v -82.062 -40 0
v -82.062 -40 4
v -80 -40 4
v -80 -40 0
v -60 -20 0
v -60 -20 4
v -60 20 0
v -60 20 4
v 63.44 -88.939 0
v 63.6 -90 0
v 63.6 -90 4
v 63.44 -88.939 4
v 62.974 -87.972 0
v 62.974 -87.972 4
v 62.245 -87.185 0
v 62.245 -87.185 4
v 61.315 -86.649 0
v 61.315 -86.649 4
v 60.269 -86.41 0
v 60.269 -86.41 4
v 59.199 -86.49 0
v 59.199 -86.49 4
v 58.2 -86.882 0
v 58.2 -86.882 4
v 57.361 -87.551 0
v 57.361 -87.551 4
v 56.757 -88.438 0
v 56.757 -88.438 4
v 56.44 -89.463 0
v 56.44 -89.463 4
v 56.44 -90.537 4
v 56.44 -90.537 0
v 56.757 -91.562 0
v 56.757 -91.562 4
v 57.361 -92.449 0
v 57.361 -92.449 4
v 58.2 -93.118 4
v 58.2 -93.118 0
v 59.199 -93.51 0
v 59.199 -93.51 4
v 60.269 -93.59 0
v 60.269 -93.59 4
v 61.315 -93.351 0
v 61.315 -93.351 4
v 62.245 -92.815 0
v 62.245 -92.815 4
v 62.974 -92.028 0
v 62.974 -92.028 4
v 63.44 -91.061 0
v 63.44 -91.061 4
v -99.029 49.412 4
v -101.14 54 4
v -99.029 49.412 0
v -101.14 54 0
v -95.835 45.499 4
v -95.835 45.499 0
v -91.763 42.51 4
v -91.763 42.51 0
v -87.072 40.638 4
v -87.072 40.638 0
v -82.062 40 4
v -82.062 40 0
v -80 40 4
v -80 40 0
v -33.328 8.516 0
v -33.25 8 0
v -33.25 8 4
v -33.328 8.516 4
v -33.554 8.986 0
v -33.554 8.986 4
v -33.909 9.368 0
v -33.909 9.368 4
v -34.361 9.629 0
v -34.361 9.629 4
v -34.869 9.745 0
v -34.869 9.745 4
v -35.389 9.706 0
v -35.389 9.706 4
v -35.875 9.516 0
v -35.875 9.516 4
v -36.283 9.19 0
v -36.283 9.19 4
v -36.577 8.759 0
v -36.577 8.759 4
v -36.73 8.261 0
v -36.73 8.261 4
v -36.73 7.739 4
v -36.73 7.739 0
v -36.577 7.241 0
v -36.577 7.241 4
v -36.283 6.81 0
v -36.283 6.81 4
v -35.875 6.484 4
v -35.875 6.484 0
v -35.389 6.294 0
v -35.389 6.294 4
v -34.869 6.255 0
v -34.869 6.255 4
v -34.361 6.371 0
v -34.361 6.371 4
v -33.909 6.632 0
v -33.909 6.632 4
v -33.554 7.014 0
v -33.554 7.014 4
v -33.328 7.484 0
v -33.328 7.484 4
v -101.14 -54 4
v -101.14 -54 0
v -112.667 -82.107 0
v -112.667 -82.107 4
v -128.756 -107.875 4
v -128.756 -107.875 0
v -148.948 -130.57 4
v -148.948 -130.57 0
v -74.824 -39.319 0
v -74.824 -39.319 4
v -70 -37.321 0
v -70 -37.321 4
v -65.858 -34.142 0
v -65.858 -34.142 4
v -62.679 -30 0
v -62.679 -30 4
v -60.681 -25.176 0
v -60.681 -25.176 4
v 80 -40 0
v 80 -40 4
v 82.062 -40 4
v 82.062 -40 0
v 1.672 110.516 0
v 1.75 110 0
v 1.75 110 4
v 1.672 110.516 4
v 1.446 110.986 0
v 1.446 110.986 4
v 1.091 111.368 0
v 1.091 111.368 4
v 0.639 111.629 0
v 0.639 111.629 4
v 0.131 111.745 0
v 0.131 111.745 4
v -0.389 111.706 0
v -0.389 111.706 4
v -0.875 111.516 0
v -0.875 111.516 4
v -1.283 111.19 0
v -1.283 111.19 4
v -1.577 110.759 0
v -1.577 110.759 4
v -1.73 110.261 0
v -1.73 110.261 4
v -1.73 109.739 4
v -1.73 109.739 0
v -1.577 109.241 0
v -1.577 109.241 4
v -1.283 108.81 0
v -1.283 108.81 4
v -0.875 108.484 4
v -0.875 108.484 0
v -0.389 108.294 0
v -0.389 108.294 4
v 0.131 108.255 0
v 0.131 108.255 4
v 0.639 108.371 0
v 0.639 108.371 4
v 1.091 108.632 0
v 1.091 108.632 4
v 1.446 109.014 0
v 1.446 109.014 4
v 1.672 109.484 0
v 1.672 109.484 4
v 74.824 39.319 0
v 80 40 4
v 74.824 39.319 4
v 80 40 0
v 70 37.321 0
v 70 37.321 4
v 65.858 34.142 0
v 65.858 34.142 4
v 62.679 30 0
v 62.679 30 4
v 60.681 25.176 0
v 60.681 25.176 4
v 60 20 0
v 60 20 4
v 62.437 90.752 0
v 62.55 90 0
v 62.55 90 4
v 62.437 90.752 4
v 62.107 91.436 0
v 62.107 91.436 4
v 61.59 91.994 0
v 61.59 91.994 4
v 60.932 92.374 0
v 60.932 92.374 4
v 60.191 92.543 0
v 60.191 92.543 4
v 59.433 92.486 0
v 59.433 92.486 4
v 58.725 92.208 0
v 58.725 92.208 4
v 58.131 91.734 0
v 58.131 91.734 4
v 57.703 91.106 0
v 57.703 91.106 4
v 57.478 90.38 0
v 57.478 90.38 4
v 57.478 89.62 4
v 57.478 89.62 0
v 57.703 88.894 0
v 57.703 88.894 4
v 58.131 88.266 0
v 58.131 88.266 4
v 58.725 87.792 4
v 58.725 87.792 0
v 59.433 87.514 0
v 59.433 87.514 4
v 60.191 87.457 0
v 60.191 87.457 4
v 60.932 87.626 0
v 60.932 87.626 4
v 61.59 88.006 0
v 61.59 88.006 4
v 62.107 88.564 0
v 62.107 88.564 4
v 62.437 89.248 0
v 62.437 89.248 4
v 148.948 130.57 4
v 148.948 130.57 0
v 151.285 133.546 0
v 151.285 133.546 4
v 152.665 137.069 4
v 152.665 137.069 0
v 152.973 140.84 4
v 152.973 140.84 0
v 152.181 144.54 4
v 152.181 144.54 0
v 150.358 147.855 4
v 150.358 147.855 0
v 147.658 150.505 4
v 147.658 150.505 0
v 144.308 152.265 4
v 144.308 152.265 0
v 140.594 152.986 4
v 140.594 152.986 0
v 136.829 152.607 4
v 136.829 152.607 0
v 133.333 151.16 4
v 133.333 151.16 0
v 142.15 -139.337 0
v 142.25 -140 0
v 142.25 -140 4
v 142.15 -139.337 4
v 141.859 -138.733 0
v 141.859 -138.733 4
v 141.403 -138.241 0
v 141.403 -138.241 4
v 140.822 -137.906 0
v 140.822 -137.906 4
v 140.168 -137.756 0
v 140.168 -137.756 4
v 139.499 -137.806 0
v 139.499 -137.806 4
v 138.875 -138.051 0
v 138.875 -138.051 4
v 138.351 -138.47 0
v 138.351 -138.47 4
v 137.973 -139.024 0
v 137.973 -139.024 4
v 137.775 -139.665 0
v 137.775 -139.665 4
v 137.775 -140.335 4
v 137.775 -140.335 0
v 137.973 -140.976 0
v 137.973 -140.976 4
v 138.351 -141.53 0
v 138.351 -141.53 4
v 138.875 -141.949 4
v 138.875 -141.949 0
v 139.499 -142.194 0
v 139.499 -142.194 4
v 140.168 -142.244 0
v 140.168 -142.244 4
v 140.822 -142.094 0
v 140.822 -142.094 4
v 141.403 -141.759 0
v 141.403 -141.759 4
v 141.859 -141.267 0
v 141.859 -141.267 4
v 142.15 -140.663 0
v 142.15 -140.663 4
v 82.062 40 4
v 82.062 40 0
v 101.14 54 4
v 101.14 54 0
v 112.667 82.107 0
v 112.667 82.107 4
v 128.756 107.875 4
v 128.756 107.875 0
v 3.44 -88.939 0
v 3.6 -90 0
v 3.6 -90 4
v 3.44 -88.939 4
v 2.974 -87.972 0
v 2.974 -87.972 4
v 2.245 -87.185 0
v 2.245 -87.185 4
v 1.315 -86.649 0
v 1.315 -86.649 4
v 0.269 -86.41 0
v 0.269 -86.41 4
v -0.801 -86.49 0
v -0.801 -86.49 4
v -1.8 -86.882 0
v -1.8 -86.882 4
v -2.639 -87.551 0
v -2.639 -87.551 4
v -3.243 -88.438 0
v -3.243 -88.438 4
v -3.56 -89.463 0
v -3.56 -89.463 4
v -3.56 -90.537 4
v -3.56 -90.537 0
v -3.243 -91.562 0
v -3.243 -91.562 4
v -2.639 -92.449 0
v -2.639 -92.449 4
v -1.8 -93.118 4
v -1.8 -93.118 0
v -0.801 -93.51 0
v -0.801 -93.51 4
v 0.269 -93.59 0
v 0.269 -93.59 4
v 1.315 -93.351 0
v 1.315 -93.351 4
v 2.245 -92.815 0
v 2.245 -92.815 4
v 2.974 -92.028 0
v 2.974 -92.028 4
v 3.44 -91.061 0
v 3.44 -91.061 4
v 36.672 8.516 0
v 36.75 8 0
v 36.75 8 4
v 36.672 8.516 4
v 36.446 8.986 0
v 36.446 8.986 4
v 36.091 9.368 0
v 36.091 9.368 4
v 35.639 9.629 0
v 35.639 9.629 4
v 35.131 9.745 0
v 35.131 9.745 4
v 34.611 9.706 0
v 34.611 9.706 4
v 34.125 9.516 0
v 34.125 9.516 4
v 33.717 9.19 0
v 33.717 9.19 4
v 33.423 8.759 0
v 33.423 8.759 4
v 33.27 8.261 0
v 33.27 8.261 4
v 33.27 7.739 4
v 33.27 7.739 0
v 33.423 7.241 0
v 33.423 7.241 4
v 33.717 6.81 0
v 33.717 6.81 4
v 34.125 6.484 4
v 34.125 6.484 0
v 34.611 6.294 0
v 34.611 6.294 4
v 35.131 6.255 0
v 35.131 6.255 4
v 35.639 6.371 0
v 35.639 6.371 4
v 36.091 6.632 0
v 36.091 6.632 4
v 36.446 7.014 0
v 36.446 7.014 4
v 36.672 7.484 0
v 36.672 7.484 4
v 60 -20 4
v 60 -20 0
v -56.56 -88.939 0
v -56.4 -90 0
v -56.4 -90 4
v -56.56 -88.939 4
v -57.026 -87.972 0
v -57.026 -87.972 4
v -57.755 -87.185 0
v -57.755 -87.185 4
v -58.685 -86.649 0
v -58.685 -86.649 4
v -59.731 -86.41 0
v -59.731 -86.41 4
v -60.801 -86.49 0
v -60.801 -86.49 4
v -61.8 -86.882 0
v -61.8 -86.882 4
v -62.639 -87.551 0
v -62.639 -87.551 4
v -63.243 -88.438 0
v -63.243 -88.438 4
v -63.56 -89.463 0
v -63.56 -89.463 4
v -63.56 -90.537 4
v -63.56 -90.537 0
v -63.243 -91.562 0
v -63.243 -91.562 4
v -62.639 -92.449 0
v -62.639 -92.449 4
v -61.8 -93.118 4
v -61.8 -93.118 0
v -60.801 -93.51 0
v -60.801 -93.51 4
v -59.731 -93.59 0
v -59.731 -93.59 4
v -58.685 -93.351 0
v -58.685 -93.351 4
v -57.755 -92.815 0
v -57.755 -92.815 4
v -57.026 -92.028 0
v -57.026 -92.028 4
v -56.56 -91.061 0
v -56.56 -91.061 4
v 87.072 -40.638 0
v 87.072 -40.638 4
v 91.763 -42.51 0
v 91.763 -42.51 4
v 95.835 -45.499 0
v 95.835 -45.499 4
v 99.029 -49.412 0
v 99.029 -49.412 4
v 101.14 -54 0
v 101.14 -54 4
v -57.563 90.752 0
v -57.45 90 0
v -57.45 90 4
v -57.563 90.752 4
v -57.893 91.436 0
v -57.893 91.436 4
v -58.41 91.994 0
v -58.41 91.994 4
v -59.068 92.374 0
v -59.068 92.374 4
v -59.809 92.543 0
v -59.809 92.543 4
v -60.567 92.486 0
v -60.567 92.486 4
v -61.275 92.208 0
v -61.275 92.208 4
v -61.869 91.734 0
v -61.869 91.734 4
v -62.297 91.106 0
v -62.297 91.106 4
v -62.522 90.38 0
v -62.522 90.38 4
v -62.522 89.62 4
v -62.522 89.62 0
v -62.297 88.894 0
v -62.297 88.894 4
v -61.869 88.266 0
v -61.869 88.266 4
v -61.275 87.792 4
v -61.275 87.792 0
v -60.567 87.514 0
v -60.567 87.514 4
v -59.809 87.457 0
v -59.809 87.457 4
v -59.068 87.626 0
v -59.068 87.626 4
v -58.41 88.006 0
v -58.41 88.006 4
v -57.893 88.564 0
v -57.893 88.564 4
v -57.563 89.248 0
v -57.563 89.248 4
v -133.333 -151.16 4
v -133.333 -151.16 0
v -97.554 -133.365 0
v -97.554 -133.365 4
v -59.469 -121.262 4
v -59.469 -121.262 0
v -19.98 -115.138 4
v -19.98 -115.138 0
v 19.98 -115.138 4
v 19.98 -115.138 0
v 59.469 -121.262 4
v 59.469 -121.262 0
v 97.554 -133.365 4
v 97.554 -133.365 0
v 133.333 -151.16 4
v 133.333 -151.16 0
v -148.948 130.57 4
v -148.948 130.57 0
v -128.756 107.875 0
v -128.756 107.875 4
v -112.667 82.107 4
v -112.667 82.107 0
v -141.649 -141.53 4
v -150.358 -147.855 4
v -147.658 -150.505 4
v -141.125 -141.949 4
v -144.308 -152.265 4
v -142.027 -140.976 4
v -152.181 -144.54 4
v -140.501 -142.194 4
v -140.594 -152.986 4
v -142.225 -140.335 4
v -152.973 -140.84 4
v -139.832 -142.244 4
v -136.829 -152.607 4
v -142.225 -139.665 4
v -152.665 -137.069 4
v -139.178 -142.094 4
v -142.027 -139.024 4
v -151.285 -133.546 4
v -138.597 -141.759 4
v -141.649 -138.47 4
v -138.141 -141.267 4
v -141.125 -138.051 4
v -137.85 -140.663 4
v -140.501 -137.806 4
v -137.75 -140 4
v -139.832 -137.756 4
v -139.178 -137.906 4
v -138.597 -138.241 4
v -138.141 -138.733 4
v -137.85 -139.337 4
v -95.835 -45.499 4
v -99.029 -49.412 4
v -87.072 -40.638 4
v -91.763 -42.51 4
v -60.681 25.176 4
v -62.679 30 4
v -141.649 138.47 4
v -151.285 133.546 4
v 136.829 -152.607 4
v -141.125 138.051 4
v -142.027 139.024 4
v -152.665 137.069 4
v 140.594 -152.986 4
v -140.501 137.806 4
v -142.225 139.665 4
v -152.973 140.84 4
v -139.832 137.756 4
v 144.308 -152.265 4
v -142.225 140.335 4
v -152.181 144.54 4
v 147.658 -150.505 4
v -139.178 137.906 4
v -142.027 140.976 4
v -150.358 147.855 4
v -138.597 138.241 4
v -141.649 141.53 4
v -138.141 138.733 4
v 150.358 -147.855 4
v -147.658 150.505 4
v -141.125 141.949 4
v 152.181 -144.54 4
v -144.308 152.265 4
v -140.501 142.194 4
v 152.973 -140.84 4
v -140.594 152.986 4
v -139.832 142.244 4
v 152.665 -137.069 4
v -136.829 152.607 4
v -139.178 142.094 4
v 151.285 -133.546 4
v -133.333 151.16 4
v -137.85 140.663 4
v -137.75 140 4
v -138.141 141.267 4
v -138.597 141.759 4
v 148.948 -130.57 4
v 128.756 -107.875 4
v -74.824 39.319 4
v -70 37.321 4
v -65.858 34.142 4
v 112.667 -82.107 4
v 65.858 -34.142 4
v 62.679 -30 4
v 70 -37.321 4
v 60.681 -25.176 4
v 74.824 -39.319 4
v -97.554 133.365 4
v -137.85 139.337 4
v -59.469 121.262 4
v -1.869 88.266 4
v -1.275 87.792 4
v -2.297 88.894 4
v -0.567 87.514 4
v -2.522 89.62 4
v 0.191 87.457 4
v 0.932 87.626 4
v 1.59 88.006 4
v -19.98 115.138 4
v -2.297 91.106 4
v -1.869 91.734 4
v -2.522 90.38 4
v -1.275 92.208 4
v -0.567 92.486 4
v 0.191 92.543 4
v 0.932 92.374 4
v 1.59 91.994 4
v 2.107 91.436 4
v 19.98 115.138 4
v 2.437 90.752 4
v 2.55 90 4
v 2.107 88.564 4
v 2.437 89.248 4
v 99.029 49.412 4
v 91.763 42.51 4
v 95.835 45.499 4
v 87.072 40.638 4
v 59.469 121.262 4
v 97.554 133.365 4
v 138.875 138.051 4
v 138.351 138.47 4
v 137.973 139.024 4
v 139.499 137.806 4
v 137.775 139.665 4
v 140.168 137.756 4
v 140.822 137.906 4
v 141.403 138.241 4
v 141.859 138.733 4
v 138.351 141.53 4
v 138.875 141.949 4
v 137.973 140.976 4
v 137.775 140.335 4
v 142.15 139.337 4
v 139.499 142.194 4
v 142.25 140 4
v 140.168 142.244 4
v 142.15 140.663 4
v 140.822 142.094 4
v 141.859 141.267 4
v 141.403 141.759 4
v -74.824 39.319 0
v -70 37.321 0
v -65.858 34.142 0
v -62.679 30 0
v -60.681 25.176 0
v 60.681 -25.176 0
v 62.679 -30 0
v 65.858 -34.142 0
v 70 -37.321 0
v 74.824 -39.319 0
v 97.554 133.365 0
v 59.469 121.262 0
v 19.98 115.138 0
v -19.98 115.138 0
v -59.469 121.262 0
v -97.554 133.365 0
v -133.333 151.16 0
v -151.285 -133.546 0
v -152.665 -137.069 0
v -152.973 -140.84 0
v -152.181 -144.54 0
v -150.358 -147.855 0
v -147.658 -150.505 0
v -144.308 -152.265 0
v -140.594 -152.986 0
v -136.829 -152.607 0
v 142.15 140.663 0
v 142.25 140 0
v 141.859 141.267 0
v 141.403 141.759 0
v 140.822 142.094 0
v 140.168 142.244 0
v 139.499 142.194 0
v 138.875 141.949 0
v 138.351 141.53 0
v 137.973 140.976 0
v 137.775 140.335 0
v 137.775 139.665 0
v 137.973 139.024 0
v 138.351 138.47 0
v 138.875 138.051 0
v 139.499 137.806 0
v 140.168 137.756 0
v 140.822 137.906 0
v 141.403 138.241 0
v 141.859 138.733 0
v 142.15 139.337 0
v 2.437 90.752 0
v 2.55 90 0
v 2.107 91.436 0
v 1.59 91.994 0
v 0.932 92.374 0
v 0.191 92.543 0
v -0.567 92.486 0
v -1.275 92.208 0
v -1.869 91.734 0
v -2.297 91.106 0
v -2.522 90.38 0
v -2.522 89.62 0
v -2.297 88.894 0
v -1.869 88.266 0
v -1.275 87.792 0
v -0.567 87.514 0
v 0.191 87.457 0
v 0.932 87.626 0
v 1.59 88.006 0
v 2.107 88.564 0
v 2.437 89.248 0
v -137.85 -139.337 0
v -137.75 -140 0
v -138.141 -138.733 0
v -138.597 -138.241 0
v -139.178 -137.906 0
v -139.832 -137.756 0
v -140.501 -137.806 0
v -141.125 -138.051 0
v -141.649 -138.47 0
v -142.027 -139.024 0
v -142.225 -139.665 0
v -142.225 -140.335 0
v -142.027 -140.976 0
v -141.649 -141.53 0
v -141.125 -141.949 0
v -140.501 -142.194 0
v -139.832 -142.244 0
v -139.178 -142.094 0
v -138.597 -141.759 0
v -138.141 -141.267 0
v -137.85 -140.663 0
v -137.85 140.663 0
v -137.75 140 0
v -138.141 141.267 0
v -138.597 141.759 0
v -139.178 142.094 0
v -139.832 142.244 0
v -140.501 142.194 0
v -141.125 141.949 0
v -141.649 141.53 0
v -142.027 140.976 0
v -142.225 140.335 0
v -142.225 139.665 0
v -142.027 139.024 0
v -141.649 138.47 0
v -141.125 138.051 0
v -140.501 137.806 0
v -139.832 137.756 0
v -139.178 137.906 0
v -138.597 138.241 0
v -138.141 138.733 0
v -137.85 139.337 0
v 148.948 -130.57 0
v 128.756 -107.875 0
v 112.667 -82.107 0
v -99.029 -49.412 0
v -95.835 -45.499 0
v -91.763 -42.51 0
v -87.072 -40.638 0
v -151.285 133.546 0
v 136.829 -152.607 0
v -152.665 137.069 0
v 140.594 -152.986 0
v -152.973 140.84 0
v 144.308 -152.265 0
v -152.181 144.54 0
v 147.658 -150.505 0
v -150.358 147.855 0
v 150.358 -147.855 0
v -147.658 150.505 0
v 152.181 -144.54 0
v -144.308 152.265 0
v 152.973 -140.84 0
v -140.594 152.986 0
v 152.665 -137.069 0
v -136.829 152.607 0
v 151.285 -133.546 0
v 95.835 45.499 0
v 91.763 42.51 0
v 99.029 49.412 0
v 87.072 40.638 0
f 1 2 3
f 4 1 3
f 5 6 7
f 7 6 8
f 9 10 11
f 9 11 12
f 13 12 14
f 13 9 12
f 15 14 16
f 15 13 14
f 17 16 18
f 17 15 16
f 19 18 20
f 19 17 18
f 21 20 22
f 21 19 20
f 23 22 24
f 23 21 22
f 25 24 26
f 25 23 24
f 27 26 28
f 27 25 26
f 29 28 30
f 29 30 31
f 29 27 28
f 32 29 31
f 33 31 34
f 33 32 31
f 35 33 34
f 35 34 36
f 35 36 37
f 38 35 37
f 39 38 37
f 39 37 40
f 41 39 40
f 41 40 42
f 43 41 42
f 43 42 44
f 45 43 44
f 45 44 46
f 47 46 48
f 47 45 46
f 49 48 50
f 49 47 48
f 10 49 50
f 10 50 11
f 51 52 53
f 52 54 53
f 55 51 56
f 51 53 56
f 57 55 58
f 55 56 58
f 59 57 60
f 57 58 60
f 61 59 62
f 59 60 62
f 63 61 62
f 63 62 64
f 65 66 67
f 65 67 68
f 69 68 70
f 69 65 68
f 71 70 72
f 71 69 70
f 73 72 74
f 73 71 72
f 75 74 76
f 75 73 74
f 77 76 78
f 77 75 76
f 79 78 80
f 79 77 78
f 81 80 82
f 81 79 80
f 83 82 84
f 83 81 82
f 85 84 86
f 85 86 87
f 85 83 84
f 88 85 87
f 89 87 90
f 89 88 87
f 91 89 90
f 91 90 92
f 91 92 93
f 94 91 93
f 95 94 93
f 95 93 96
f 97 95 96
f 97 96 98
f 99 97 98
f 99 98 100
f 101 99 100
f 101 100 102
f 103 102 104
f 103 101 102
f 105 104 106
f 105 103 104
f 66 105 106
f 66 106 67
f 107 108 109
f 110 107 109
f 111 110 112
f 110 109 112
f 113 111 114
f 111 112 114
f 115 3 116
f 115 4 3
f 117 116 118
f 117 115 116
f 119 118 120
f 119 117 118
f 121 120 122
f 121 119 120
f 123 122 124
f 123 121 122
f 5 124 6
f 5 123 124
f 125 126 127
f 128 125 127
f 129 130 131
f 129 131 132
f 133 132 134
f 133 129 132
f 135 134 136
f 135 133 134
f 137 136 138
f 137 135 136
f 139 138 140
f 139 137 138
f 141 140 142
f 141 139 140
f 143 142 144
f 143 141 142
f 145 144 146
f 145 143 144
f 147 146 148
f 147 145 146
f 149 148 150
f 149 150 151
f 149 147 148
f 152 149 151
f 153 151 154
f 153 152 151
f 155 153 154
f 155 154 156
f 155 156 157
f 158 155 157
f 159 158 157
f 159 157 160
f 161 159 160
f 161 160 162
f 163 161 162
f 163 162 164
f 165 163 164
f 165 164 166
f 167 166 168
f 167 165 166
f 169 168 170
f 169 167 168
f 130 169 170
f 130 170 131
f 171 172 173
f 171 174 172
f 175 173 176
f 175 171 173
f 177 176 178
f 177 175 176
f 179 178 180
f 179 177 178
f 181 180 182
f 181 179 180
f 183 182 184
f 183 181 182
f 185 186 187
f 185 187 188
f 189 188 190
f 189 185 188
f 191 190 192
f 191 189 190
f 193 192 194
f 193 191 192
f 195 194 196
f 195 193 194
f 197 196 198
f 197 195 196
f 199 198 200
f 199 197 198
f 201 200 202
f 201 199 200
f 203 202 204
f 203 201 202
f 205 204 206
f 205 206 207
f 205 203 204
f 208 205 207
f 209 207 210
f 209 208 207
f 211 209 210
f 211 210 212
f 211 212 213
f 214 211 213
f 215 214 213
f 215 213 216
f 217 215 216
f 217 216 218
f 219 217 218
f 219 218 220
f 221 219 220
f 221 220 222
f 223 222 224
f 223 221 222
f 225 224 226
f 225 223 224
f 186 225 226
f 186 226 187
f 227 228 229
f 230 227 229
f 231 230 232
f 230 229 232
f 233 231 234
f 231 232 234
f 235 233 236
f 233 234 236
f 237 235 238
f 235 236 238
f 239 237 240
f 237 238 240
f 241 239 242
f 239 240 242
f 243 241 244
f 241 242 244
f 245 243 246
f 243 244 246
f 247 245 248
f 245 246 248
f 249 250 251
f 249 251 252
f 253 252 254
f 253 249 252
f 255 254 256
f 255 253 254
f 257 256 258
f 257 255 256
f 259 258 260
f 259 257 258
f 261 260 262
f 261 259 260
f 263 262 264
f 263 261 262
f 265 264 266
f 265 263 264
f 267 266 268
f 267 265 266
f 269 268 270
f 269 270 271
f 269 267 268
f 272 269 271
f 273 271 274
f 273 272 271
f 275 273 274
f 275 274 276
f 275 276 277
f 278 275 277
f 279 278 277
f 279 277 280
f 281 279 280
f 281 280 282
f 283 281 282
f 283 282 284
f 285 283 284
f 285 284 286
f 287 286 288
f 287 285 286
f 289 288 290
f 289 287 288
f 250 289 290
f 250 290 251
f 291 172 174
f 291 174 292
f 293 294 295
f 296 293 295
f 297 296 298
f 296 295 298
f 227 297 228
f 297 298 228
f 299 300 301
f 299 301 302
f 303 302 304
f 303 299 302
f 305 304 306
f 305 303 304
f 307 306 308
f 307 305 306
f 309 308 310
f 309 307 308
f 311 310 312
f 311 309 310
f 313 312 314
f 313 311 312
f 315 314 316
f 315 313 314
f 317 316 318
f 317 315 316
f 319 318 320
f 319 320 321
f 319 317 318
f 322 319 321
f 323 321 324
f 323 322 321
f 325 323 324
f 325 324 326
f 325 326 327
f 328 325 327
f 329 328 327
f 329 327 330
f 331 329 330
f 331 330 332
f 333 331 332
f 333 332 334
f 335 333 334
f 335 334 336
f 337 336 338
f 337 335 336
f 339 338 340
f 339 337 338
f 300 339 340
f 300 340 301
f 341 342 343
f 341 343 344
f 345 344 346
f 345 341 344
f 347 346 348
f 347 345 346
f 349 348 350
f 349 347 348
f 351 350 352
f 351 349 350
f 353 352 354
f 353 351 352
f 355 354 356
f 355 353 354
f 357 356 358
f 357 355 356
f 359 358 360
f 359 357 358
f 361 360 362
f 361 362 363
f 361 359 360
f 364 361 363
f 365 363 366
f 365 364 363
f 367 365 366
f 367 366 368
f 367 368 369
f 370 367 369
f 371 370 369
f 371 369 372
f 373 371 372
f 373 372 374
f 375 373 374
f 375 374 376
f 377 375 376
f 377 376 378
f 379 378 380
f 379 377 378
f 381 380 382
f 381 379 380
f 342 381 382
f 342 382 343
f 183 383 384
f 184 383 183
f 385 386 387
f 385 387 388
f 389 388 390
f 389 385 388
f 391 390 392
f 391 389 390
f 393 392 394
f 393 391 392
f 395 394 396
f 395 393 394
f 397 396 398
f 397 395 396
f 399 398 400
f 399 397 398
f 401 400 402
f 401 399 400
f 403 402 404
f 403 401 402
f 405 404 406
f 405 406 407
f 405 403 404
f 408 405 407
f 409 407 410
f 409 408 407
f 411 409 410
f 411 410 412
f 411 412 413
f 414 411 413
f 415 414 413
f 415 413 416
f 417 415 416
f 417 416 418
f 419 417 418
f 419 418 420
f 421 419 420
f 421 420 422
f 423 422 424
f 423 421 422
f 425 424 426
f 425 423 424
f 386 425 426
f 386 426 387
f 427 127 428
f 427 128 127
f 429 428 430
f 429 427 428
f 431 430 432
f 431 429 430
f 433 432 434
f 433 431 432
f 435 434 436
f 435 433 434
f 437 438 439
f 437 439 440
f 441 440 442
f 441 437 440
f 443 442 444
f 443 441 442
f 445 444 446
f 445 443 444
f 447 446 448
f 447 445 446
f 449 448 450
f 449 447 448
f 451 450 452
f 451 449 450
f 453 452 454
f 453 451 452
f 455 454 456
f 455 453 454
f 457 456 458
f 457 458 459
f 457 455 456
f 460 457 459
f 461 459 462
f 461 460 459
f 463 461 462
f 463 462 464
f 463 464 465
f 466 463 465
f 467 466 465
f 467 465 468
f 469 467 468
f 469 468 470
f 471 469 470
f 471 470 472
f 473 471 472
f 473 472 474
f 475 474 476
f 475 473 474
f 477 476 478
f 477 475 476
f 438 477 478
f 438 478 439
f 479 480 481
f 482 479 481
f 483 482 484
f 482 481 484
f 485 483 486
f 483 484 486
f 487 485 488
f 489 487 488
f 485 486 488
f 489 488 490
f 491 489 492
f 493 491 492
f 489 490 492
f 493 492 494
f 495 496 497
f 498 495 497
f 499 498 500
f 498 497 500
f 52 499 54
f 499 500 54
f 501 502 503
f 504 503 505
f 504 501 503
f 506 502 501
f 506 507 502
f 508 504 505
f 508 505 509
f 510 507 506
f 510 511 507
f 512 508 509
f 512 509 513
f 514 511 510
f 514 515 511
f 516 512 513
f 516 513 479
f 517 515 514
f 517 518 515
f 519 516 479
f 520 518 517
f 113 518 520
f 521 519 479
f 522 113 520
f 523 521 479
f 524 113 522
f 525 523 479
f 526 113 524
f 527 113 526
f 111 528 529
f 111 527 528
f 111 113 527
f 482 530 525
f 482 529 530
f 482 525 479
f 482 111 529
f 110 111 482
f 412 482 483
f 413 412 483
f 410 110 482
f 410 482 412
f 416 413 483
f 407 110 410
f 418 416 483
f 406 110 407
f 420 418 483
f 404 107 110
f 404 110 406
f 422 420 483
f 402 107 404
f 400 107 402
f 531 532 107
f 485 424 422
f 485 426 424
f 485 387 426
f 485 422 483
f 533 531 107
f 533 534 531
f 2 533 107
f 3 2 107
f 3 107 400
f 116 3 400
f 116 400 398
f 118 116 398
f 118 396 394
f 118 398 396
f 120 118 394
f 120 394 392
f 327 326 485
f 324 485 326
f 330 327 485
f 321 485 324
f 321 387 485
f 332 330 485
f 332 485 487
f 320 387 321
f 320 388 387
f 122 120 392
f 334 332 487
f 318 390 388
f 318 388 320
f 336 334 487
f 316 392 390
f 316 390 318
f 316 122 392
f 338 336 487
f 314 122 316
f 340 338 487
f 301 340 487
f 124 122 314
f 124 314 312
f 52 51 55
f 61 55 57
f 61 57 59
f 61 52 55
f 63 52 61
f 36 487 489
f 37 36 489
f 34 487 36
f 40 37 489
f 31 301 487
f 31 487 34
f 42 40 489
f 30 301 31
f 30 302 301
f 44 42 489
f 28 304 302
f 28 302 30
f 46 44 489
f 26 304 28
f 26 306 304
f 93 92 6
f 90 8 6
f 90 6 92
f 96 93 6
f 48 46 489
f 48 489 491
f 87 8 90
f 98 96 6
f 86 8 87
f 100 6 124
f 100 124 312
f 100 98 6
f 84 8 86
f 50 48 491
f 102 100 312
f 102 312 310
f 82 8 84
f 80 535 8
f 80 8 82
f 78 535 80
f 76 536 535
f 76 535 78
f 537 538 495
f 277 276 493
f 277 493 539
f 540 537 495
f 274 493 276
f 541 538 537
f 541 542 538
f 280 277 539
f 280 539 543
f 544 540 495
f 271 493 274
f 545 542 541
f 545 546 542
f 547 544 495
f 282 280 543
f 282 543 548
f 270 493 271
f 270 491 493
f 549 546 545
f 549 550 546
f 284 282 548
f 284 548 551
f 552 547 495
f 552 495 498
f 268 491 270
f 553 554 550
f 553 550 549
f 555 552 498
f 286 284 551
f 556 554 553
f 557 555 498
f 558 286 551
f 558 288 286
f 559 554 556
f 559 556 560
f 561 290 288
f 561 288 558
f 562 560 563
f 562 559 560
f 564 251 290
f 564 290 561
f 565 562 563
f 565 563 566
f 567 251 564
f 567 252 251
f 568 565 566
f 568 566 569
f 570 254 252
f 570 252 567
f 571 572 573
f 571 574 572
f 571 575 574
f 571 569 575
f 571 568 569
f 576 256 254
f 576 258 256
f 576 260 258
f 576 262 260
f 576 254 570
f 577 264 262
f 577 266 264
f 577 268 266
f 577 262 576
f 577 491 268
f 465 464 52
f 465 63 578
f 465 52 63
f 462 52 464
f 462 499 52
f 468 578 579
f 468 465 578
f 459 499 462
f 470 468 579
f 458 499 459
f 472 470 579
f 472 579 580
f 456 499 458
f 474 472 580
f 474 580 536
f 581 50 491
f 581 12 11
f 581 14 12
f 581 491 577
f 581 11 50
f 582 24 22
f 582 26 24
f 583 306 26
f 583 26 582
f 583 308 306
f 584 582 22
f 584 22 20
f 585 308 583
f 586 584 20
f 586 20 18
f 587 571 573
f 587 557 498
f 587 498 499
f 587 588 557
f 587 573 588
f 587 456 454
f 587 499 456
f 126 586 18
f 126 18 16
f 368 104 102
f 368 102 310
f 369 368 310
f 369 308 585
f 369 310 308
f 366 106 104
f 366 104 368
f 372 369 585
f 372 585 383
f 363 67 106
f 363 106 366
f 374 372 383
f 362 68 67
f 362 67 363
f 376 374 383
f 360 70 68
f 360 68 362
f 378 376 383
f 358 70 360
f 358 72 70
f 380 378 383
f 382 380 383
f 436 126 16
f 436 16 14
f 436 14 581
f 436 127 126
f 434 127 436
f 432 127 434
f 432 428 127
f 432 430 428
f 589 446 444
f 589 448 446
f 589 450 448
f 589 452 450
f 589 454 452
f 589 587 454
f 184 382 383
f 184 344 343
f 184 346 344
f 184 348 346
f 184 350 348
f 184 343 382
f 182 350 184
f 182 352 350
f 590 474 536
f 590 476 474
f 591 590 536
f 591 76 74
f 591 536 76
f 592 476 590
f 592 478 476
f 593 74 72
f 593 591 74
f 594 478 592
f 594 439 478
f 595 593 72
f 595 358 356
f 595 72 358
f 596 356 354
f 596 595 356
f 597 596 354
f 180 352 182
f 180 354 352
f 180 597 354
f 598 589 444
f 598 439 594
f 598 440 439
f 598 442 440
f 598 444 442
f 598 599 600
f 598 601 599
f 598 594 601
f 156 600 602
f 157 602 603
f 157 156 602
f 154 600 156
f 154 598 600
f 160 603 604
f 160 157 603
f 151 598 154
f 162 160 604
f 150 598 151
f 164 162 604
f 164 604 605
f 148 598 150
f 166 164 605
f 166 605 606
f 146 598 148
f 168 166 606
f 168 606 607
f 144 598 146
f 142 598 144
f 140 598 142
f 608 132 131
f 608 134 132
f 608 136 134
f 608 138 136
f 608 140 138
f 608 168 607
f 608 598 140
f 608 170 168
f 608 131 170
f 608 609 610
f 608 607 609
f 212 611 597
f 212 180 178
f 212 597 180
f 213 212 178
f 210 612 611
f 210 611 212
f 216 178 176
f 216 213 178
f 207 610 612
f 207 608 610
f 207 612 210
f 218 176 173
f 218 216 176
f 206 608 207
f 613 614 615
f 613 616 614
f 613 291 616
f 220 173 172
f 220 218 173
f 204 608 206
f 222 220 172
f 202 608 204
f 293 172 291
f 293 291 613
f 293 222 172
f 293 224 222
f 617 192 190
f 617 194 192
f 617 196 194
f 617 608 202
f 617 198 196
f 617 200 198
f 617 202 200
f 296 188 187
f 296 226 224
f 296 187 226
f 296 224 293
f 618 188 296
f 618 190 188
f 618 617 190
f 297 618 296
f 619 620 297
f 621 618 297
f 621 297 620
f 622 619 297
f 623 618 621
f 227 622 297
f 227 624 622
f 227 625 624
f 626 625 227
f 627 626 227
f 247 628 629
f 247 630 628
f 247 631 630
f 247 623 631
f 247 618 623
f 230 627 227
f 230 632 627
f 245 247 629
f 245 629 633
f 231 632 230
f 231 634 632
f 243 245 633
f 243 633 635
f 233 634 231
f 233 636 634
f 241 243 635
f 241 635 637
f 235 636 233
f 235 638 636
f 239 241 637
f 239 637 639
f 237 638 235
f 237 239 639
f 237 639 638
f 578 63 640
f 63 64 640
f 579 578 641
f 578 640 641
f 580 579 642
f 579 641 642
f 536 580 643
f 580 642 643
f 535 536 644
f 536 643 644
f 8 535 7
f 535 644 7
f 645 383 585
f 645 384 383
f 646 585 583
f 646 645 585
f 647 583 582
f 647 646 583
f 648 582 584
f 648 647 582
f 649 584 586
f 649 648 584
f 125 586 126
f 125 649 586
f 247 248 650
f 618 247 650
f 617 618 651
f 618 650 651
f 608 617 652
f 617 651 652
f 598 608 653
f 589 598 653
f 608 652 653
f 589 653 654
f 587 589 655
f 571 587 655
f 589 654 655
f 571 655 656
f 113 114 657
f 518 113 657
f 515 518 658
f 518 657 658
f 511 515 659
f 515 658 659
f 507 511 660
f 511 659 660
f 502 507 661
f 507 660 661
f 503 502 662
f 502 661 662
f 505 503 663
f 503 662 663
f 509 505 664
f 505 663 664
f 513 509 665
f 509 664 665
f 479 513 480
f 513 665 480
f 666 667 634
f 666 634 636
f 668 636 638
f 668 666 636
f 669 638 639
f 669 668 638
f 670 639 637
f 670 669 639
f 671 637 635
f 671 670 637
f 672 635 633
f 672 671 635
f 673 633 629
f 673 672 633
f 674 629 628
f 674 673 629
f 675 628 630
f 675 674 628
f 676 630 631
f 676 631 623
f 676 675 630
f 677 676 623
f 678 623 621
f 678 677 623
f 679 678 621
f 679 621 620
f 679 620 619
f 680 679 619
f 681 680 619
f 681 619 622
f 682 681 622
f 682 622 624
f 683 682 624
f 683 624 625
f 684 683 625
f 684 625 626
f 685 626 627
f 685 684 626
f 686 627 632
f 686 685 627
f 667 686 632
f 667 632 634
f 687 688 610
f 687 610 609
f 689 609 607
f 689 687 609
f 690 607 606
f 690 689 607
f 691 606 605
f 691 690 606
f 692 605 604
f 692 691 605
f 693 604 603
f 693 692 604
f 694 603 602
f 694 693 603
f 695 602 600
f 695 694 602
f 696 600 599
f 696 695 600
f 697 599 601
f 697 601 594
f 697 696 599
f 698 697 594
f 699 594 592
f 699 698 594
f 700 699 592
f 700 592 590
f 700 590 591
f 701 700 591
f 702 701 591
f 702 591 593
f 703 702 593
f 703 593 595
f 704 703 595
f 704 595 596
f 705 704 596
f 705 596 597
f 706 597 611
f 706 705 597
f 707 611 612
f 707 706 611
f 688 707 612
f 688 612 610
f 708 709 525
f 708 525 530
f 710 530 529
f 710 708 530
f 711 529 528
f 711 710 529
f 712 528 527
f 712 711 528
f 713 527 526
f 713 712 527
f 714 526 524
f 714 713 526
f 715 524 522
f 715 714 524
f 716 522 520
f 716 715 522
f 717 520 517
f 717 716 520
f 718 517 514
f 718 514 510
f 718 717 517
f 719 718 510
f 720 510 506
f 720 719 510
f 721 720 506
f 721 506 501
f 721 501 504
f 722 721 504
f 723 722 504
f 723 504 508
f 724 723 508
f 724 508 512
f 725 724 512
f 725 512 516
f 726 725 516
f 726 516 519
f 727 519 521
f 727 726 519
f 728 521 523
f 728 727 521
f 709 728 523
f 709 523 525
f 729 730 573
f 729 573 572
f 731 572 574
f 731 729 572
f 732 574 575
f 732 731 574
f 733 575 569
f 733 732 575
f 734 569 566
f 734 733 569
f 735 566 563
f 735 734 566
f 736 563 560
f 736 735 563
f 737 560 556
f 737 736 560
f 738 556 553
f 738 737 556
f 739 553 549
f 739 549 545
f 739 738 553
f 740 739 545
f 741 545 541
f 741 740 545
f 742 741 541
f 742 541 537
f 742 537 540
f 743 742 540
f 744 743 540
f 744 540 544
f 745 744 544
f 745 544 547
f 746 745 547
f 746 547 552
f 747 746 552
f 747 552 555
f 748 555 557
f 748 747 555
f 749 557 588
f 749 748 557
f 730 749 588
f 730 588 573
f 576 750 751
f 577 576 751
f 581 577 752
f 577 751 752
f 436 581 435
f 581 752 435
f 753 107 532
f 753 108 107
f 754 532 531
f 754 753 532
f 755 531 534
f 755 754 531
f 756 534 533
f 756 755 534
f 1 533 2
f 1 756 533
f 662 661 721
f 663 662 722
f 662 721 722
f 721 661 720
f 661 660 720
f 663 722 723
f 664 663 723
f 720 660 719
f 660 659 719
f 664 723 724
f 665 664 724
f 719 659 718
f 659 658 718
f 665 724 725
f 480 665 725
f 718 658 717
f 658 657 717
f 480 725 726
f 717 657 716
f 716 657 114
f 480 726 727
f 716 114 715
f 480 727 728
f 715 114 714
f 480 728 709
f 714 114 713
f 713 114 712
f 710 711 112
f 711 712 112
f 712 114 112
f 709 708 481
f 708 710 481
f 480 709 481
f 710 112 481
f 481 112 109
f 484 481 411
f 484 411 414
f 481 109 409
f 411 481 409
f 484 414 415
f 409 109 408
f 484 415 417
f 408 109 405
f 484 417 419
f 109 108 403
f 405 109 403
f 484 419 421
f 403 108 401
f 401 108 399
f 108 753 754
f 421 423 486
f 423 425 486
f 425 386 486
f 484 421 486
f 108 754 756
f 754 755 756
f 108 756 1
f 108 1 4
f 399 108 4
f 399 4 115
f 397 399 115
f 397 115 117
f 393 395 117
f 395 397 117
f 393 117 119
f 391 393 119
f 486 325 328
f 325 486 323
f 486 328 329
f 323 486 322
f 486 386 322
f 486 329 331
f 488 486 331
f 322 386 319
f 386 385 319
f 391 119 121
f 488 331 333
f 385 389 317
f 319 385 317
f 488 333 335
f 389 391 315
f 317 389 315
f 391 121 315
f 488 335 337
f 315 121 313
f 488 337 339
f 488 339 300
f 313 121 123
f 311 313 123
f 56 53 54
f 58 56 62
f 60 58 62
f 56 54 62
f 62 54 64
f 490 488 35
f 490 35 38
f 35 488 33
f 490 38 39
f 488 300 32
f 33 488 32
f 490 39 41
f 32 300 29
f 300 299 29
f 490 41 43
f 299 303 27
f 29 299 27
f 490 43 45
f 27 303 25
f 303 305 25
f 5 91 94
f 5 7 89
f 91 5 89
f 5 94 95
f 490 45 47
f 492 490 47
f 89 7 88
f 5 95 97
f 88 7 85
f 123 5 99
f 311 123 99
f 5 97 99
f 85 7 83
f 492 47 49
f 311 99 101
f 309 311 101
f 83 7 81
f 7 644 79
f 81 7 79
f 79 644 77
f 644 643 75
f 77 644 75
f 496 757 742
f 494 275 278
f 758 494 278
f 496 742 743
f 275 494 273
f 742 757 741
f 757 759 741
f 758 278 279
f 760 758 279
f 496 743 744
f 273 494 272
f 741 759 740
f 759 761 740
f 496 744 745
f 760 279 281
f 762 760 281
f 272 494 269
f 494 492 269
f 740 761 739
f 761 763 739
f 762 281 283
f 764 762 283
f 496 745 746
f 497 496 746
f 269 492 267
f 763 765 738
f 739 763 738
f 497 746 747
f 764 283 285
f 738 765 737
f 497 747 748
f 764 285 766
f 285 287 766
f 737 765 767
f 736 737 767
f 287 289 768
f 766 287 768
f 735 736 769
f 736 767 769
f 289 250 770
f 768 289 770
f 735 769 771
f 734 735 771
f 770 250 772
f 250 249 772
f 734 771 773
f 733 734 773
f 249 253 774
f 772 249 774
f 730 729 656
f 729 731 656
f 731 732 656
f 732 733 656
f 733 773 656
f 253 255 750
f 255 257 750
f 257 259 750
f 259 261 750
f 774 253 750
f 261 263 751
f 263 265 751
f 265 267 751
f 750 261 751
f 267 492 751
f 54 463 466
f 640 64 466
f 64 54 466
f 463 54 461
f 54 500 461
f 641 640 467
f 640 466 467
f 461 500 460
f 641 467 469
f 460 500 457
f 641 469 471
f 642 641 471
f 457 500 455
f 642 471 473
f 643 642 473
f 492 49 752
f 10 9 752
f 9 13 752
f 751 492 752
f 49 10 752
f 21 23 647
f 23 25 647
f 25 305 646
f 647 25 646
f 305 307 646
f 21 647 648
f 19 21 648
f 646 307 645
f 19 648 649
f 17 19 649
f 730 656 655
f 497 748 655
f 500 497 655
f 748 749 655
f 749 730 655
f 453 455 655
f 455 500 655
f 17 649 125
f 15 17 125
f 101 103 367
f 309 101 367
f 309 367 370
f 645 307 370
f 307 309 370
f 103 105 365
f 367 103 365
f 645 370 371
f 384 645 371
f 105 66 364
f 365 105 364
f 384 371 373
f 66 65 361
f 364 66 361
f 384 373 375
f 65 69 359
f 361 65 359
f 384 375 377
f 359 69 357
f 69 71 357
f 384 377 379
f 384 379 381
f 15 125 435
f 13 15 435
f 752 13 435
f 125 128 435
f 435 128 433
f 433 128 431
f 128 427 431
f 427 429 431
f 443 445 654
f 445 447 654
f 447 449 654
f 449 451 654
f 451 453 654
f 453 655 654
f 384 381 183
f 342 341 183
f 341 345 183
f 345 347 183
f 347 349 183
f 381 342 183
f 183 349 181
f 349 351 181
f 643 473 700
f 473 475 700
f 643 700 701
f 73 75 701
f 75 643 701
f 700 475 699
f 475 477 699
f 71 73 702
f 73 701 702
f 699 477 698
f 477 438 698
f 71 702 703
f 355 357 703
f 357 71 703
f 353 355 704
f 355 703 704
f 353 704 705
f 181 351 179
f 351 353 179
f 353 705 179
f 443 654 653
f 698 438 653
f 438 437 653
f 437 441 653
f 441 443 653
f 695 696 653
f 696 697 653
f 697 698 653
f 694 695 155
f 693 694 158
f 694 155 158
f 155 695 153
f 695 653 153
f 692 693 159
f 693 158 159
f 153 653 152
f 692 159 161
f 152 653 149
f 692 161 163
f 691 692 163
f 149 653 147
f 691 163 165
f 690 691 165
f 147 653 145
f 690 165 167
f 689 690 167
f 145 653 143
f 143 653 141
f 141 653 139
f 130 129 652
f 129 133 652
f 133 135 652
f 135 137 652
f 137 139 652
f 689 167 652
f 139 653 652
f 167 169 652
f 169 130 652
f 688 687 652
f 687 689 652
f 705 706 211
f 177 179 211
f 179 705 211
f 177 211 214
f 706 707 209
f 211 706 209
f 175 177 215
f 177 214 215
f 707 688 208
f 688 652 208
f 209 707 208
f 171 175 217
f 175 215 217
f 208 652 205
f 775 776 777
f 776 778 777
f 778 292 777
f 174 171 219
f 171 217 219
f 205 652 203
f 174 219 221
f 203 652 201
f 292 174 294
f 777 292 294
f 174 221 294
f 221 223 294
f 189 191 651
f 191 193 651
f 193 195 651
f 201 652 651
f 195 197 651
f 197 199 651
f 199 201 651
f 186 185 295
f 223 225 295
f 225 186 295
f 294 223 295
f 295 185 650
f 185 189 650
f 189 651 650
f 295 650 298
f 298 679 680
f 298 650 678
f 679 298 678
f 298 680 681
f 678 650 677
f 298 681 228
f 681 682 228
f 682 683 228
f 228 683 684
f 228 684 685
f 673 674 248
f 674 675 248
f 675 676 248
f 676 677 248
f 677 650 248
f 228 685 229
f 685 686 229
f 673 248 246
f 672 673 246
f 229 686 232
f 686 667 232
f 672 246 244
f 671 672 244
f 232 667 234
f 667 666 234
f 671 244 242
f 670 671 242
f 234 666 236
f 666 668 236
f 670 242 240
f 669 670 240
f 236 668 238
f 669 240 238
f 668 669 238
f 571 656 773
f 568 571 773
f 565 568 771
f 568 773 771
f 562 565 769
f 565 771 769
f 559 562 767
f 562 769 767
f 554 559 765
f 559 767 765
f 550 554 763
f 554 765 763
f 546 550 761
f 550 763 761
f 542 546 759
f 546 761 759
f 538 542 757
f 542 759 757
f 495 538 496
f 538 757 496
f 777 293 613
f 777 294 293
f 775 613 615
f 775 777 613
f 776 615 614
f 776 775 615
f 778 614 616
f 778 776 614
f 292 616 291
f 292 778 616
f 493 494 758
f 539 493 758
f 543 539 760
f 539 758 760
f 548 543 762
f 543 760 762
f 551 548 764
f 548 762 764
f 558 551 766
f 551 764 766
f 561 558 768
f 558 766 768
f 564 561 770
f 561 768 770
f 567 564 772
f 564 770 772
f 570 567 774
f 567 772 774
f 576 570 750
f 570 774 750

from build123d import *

# Parameters (mm, degrees)
SKETCH_1_R          = 2.55
SKETCH_1_R_2        = 3.6
SKETCH_1_R_3        = 2.25
SKETCH_1_R_4        = 1.75
EXTRUDE_1_DEPTH     = 4
SKETCH_2_W          = 60.730368491
SKETCH_2_H          = 80
CUT_EXTRUDE_1_DEPTH = 10
FILLET_1_R          = 20


with BuildPart() as part:
    # 草图1 → 凸台-拉伸1 (new body)
    with BuildSketch(Plane.XY):
        with BuildLine():
            ThreePointArc((-133.333333333, 151.160446029), (-150.358269338, 147.855332986), (-148.948414541, 130.569948187))
            ThreePointArc((-148.948414541, 130.569948187), (-92.849538953, 0), (-148.948414541, -130.569948187))
            ThreePointArc((-148.948414541, -130.569948187), (-150.358269338, -147.855332986), (-133.333333333, -151.160446029))
            ThreePointArc((-133.333333333, -151.160446029), (0, -114.369366599), (133.333333333, -151.160446029))
            ThreePointArc((133.333333333, -151.160446029), (150.358269338, -147.855332986), (148.948414541, -130.569948187))
            ThreePointArc((148.948414541, -130.569948187), (92.849538953, 0), (148.948414541, 130.569948187))
            ThreePointArc((148.948414541, 130.569948187), (150.358269338, 147.855332986), (133.333333333, 151.160446029))
            ThreePointArc((133.333333333, 151.160446029), (0, 114.369366599), (-133.333333333, 151.160446029))
        make_face()
        with Locations((0, 90)):
            Circle(SKETCH_1_R, mode=Mode.SUBTRACT)
        with Locations((0, -90)):
            Circle(SKETCH_1_R_2, mode=Mode.SUBTRACT)
        with Locations((60, 90)):
            Circle(SKETCH_1_R, mode=Mode.SUBTRACT)
        with Locations((60, -90)):
            Circle(SKETCH_1_R_2, mode=Mode.SUBTRACT)
        with Locations((-60, 90)):
            Circle(SKETCH_1_R, mode=Mode.SUBTRACT)
        with Locations((-60, -90)):
            Circle(SKETCH_1_R_2, mode=Mode.SUBTRACT)
        with Locations((-140, 140)):
            Circle(SKETCH_1_R_3, mode=Mode.SUBTRACT)
        with Locations((140, 140)):
            Circle(SKETCH_1_R_3, mode=Mode.SUBTRACT)
        with Locations((-140, -140)):
            Circle(SKETCH_1_R_3, mode=Mode.SUBTRACT)
        with Locations((140, -140)):
            Circle(SKETCH_1_R_3, mode=Mode.SUBTRACT)
        with Locations((-35, 8)):
            Circle(SKETCH_1_R_4, mode=Mode.SUBTRACT)
        with Locations((35, 8)):
            Circle(SKETCH_1_R_4, mode=Mode.SUBTRACT)
        with Locations((0, 110)):
            Circle(SKETCH_1_R_4, mode=Mode.SUBTRACT)
    extrude(amount=EXTRUDE_1_DEPTH)

    # 草图2 → 切除-拉伸1 (cut)
    with BuildSketch(Plane.XY.offset(4)):
        with Locations((-90.365184246, 0)):
            Rectangle(SKETCH_2_W, SKETCH_2_H)
        with Locations((90.365184246, 0)):
            Rectangle(SKETCH_2_W, SKETCH_2_H)
    extrude(amount=-CUT_EXTRUDE_1_DEPTH, mode=Mode.SUBTRACT)

    # 圆角1
    fillet_1_edges = [part.edges().sort_by_distance(p)[0] for p in [
        (60, -40, 2),
        (60, 40, 2),
        (-97.350251205, -40, 2),
        (-97.350251205, 40, 2),
        (-60, 40, 2),
        (-60, -40, 2),
        (97.350251205, 40, 2),
        (97.350251205, -40, 2),
    ]]
    fillet(fillet_1_edges, radius=FILLET_1_R)


solid = part.part
